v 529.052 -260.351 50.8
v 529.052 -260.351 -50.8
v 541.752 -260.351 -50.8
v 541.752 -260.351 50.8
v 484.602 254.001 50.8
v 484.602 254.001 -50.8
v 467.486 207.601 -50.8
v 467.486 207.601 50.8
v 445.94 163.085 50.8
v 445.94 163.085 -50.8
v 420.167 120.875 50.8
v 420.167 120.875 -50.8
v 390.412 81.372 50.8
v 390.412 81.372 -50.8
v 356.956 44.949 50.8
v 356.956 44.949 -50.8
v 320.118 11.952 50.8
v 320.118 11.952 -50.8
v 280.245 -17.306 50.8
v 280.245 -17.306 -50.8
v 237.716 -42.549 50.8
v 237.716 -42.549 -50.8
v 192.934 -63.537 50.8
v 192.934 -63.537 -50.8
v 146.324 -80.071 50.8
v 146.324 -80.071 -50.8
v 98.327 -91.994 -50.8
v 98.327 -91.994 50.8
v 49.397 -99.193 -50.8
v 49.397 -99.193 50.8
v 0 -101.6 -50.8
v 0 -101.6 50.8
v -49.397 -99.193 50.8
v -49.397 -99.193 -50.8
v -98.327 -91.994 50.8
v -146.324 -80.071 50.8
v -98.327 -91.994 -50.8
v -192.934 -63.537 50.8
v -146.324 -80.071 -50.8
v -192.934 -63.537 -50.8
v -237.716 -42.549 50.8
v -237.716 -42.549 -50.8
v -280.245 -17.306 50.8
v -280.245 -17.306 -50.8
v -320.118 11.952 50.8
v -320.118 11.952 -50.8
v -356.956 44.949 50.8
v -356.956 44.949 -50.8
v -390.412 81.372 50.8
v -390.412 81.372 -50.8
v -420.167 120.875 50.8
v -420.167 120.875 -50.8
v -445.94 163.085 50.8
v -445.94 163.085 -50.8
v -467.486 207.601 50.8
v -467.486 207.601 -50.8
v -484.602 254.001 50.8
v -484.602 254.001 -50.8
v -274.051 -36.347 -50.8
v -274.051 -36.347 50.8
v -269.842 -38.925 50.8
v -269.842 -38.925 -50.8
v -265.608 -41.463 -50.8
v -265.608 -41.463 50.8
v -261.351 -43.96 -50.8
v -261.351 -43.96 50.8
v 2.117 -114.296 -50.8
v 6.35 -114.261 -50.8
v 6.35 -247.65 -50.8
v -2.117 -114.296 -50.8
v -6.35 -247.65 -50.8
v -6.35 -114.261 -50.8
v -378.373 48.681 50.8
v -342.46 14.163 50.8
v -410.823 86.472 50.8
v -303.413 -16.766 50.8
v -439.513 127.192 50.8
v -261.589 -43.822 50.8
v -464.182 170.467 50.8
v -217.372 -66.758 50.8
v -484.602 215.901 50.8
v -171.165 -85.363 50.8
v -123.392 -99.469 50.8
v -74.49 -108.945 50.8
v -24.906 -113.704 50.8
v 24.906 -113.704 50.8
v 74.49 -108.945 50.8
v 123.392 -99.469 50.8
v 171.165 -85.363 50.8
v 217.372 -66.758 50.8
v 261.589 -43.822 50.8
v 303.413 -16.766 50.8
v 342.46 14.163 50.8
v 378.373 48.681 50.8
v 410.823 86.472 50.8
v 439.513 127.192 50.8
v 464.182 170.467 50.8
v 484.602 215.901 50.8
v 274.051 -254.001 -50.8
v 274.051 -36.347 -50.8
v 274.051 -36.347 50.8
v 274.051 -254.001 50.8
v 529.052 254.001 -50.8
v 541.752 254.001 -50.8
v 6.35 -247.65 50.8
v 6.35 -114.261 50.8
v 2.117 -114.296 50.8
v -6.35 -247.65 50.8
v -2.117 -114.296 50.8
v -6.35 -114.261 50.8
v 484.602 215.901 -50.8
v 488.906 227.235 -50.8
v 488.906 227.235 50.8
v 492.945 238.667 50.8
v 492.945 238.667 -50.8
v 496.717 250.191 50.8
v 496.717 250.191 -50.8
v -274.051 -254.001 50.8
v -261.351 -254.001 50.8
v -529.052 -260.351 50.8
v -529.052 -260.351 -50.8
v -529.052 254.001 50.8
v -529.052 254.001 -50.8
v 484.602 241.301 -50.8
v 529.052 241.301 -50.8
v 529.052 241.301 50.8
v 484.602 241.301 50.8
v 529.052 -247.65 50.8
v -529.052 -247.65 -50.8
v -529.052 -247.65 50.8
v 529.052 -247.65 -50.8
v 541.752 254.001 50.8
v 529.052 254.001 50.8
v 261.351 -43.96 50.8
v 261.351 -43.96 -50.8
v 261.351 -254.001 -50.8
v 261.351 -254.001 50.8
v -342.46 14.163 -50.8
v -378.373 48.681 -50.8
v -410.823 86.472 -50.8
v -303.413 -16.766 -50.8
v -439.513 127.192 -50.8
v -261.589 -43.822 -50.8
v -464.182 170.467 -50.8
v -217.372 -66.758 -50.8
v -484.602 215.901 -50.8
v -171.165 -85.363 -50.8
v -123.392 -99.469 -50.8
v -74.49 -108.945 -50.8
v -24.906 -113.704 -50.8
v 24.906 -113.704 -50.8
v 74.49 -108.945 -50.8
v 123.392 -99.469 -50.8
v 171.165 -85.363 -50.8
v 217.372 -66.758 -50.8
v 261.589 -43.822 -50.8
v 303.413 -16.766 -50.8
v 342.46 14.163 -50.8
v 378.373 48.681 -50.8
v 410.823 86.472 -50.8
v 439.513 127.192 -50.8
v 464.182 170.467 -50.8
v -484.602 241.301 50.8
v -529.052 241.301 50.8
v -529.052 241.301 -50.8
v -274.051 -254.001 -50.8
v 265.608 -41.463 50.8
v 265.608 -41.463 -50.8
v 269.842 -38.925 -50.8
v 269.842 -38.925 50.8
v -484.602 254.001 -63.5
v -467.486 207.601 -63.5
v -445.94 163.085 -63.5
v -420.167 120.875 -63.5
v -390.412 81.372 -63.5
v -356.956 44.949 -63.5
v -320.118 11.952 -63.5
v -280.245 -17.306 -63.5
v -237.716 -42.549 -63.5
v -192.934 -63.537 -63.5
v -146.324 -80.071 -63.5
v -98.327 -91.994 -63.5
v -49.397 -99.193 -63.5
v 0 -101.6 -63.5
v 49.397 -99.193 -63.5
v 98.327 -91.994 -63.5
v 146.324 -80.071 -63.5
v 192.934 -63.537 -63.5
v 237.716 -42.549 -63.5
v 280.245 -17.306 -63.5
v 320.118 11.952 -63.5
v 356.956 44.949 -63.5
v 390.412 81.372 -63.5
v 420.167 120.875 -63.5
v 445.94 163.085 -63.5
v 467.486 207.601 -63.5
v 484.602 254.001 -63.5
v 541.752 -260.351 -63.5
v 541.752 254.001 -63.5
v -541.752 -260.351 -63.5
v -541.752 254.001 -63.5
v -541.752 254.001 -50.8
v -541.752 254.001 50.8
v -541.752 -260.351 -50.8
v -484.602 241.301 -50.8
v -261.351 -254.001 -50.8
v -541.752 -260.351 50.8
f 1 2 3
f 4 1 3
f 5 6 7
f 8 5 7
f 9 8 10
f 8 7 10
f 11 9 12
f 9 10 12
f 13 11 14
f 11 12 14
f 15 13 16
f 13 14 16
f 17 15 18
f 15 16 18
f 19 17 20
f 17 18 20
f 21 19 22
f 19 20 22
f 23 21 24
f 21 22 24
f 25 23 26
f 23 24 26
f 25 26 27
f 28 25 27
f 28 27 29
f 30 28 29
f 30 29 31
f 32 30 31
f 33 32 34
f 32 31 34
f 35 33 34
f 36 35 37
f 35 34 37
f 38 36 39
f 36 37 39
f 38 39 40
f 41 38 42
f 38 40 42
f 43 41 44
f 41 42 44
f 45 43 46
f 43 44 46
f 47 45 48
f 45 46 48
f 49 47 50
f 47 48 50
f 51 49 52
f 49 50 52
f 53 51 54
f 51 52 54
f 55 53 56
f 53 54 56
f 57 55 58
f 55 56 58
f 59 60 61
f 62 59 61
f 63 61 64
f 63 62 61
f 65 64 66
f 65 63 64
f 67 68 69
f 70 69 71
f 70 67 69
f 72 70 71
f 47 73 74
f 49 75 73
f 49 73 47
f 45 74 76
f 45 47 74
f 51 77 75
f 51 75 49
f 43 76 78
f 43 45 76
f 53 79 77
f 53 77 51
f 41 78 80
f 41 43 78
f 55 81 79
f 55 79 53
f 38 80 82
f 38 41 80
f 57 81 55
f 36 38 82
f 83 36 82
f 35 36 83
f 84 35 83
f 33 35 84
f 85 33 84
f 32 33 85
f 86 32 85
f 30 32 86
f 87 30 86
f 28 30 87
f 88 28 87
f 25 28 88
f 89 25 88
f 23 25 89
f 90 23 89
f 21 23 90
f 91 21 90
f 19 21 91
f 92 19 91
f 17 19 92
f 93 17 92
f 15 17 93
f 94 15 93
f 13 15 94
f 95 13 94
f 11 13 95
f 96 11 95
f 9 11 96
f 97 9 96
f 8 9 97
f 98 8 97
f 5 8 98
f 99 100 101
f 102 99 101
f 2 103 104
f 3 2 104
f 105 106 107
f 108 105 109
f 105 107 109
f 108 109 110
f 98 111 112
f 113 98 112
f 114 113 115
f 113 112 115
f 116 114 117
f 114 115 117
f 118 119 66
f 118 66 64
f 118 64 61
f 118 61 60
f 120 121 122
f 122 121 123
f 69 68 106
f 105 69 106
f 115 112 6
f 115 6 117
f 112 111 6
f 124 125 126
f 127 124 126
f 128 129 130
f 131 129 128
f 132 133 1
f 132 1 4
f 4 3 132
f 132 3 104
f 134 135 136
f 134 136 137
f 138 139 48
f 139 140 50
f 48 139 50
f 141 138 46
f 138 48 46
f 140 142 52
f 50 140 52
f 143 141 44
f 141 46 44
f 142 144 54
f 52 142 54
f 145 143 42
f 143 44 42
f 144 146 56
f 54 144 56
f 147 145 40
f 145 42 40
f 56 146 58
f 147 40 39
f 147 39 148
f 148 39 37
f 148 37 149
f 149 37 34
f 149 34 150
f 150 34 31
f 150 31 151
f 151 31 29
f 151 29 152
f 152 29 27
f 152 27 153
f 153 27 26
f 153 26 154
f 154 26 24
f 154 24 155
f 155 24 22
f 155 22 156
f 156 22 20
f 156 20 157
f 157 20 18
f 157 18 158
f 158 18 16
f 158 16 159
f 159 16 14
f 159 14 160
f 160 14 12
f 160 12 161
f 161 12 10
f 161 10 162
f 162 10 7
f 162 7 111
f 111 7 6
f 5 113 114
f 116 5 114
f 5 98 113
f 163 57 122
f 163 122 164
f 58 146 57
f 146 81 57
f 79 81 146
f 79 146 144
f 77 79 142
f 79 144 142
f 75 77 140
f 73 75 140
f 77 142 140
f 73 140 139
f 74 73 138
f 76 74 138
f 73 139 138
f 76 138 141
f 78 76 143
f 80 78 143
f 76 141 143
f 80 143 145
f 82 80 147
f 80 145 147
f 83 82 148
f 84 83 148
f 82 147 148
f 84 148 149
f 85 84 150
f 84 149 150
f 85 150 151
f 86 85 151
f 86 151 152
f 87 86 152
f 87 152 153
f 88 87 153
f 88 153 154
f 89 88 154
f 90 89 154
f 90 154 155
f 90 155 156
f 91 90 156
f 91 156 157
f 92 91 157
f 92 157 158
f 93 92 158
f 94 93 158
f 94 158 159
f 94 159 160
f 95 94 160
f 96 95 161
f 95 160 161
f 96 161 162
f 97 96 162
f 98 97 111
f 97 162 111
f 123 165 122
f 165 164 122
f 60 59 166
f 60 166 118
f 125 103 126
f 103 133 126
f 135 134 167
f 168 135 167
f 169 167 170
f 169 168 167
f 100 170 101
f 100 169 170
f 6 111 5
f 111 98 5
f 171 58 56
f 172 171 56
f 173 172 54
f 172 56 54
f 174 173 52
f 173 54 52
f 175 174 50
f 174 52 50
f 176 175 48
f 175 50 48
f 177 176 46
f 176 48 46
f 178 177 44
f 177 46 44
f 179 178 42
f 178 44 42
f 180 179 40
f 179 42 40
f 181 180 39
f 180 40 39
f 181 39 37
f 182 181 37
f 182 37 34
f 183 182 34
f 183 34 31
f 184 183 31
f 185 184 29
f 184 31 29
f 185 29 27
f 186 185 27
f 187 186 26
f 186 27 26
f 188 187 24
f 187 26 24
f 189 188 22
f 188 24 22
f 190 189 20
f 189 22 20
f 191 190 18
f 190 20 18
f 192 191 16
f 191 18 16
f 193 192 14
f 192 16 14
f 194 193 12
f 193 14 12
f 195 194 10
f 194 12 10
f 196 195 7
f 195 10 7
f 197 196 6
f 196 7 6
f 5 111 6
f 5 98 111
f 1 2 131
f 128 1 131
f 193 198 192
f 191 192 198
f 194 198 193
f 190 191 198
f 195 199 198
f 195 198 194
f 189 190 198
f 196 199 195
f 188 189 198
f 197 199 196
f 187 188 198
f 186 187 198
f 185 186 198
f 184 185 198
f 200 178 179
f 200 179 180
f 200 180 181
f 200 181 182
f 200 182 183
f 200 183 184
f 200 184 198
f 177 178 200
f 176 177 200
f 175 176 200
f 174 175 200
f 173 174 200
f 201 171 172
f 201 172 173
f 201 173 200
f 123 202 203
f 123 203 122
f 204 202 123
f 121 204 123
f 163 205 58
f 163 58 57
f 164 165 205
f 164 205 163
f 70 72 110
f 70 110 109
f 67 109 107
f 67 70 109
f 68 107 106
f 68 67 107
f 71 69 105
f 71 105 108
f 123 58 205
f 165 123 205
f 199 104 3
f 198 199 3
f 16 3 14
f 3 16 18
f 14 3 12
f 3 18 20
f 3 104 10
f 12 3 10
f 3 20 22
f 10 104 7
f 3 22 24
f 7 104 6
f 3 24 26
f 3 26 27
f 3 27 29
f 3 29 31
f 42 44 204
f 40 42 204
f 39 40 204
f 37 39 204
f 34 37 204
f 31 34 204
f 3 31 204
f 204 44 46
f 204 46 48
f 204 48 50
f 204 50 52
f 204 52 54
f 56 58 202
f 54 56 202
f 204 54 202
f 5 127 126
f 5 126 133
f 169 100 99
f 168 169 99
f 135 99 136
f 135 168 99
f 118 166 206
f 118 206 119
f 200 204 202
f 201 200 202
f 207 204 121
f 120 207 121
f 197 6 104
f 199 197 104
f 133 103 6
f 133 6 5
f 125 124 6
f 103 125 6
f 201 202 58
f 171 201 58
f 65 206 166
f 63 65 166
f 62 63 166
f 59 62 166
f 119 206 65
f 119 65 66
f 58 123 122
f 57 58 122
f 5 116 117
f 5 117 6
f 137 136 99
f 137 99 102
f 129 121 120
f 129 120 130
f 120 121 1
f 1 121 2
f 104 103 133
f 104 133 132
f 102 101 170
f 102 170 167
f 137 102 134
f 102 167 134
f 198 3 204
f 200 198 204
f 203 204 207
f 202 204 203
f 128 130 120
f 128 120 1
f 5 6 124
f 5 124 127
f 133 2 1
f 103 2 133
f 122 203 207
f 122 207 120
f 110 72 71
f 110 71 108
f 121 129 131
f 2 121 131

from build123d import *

# Parameters (mm, degrees)
FLAT_START                                = -50.8001016
FLAT_BAR_CONFIGURED_FB_4_X_0_5_1_OUT_W    = 12.7000254
FLAT_BAR_CONFIGURED_FB_4_X_0_5_1_OUT_H    = 514.351028702
FLAT_BAR_CONFIGURED_FB_4_X_0_5_1_DEPTH    = 101.6002032
FLAT_BAR_CONFIGURED_FB_4_X_0_5_1_2_O_W    = 1058.104141648
FLAT_BAR_CONFIGURED_FB_4_X_0_5_1_2_O_H    = 12.7000254
FLAT_BAR_CONFIGURED_FB_4_X_0_5_1_2_DEPTH  = 101.6002032
FLAT_BAR_CONFIGURED_FB_4_X_0_5_1_3_O_W    = 12.7000254
FLAT_BAR_CONFIGURED_FB_4_X_0_5_1_3_O_H    = 514.351028702
FLAT_BAR_CONFIGURED_FB_4_X_0_5_1_3_DEPTH  = 101.6002032
LAYOUT11_W                                = 101.6
LAYOUT11_H                                = 12.7
MIDDLE_BAR_DEPTH                          = 152.400304801
LAYOUT6_W                                 = 101.6
LAYOUT6_H                                 = 12.7
FLAT_BAR_CONFIGURED_FB_4_X_0_5_4_DEPTH    = 50.8
LAYOUT7_W                                 = 101.6
LAYOUT7_H                                 = 12.7
FLAT_BAR_CONFIGURED_FB_4_X_0_5_5_DEPTH    = 50.8
FLAT_START_2                              = -50.8
FLAT_BAR_CONFIGURED_FB_4_X_0_5_6_DEPTH    = 101.6
TRIM_EXTEND12_START                       = -50.8
TRIM_EXTEND12_DEPTH                       = 101.6
LAYOUT9_W                                 = 101.6
LAYOUT9_H                                 = 12.7
FLAT_BAR_CONFIGURED_FB_4_X_0_5_15_DEPTH   = 228.659286135
LAYOUT9_ON_SEGMENT_2_W                    = 101.6
LAYOUT9_ON_SEGMENT_2_H                    = 12.7
FLAT_BAR_CONFIGURED_FB_4_X_0_5_15_2_DEPTH = 228.659286135
BOSS_EXTRUDE1_DEPTH                       = 12.7


# Read off the part's stored shape, not the designer's step: Flat bar - configured FB - 4 X 0.5(1), Flat bar - configured FB - 4 X 0.5(6), Trim/Extend11, Trim/Extend12
with BuildPart() as part:
    # Flat bar - configured FB - 4 X 0.5(1) out → Flat bar - configured FB - 4 X 0.5(1) (new body)
    with BuildSketch(Plane.XY.offset(FLAT_START)):
        with Locations((-535.402083524, -3.17500635)):
            Rectangle(FLAT_BAR_CONFIGURED_FB_4_X_0_5_1_OUT_W, FLAT_BAR_CONFIGURED_FB_4_X_0_5_1_OUT_H)
    extrude(amount=FLAT_BAR_CONFIGURED_FB_4_X_0_5_1_DEPTH)


with BuildPart() as body_2:
    # Flat bar - configured FB - 4 X 0.5_1 2 o → Flat bar - configured FB - 4 X 0.5_1 2 (new body)
    with BuildSketch(Plane.XY.offset(FLAT_START)):
        with Locations((0, -254.000508001)):
            Rectangle(FLAT_BAR_CONFIGURED_FB_4_X_0_5_1_2_O_W, FLAT_BAR_CONFIGURED_FB_4_X_0_5_1_2_O_H)
    extrude(amount=FLAT_BAR_CONFIGURED_FB_4_X_0_5_1_2_DEPTH)


with BuildPart() as body_3:
    # Flat bar - configured FB - 4 X 0.5_1 3 o → Flat bar - configured FB - 4 X 0.5_1 3 (new body)
    with BuildSketch(Plane.XY.offset(FLAT_START)):
        with Locations((535.402083524, -3.17500635)):
            Rectangle(FLAT_BAR_CONFIGURED_FB_4_X_0_5_1_3_O_W, FLAT_BAR_CONFIGURED_FB_4_X_0_5_1_3_O_H)
    extrude(amount=FLAT_BAR_CONFIGURED_FB_4_X_0_5_1_3_DEPTH)


with BuildPart() as body_4:
    # Layout11 → Middle Bar (new body)
    with BuildSketch(Plane(origin=(0, -101.6002032, 0), x_dir=(0, 0, 1), z_dir=(0, -1, 0))):
        Rectangle(LAYOUT11_W, LAYOUT11_H)
    extrude(amount=MIDDLE_BAR_DEPTH)

    # Trim/Extend1
    split(bisect_by=Plane(origin=(0, -247.650495301, 0), x_dir=(-1, 0, 0), z_dir=(0, 1, 0)), keep=Keep.TOP)

    # Trim/Extend12 outline → Trim/Extend12 (cut)
    with BuildSketch(Plane.XY.offset(TRIM_EXTEND12_START)):
        with BuildLine():
            ThreePointArc((-6.35, -114.261482324), (0, -114.3002032), (6.35, -114.261482324))
            Line((6.35, -114.261482324), (6.35, -101.6002032))
            Line((6.35, -101.6002032), (-6.35, -101.6002032))
            Line((-6.35, -101.6002032), (-6.35, -114.261482324))
        make_face()
    extrude(amount=TRIM_EXTEND12_DEPTH, mode=Mode.SUBTRACT)


with BuildPart() as body_5:
    # Layout6 → Flat bar - configured FB - 4 X 0.5(4) (new body)
    with BuildSketch(Plane(origin=(-535.402083524, 247.650508001, 0), x_dir=(0, 0, 1), z_dir=(1, 0, 0))):
        Rectangle(LAYOUT6_W, LAYOUT6_H)
    extrude(amount=FLAT_BAR_CONFIGURED_FB_4_X_0_5_4_DEPTH)

    # Trim/Extend7
    split(bisect_by=Plane(origin=(-529.052070824, -3.17500635, 0), x_dir=(0, 1, 0), z_dir=(1, 0, 0)), keep=Keep.TOP)


with BuildPart() as body_6:
    # Layout7 → Flat bar - configured FB - 4 X 0.5(5) (new body)
    with BuildSketch(Plane(origin=(535.402083524, 247.650508001, 0), x_dir=(0, 0, 1), z_dir=(-1, 0, 0))):
        Rectangle(LAYOUT7_W, LAYOUT7_H)
    extrude(amount=FLAT_BAR_CONFIGURED_FB_4_X_0_5_5_DEPTH)

    # Trim/Extend8
    split(bisect_by=Plane(origin=(529.052070824, -3.17500635, 0), x_dir=(0, -1, 0), z_dir=(-1, 0, 0)), keep=Keep.TOP)


with BuildPart() as body_7:
    # Flat bar - configured FB - 4 X 0.5(6) out → Flat bar - configured FB - 4 X 0.5(6) (new body)
    with BuildSketch(Plane.XY.offset(FLAT_START_2)):
        with BuildLine():
            Line((496.717111382, 250.190508001), (484.602083524, 254.000508001))
            ThreePointArc((484.602083524, 254.000508001), (0, -101.6002032), (-484.602083524, 254.000508001))
            Line((-484.602083524, 254.000508001), (-496.717111382, 250.190508001))
            ThreePointArc((-496.717111382, 250.190508001), (0, -114.3002032), (496.717111382, 250.190508001))
        make_face()
    extrude(amount=FLAT_BAR_CONFIGURED_FB_4_X_0_5_6_DEPTH)

    # Trim/Extend9
    split(bisect_by=Plane(origin=(-484.602083524, 247.650508001, 0), x_dir=(0, 1, 0), z_dir=(1, 0, 0)), keep=Keep.TOP)


with BuildPart() as body_8:
    # Trim/Extend11: the piece on the far side of the plane
    add(body_7.part)
    split(bisect_by=Plane.YZ.offset(484.602083524), keep=Keep.BOTTOM)


with BuildPart() as body_7_1:
    add(body_7.part)

    # Trim/Extend11
    split(bisect_by=Plane.YZ.offset(484.602083524), keep=Keep.TOP)


with BuildPart() as body_9:
    # Layout9 → Flat bar - configured FB - 4 X 0.5(15) (new body)
    with BuildSketch(Plane(origin=(-267.701041762, -25.341221866, 0), x_dir=(0, 0, 1), z_dir=(0, -1, 0))):
        Rectangle(LAYOUT9_W, LAYOUT9_H)
    extrude(amount=FLAT_BAR_CONFIGURED_FB_4_X_0_5_15_DEPTH)

    # Trim_Extend13 4: cut back where it meets the other member's skin (coped)
    split(bisect_by=body_8.part.faces().sort_by_distance((0, -114.3002032, 0))[0], keep=Keep.TOP)


with BuildPart() as body_10:
    # Layout9 on segment 2 (carried to segment 2) → Flat bar - configured FB - 4 X 0.5_15 2 (new body)
    with BuildSketch(Plane(origin=(267.701041762, -25.341221866, 0), x_dir=(0, 0, 1), z_dir=(0, -1, 0))):
        Rectangle(LAYOUT9_ON_SEGMENT_2_W, LAYOUT9_ON_SEGMENT_2_H)
    extrude(amount=FLAT_BAR_CONFIGURED_FB_4_X_0_5_15_2_DEPTH)

    # Trim_Extend13 4: cut back where it meets the other member's skin (coped)
    split(bisect_by=body_8.part.faces().sort_by_distance((0, -114.3002032, 0))[0], keep=Keep.TOP)


with BuildPart() as body_11:
    # Sketch3 → Boss-Extrude1 (new body)
    with BuildSketch(Plane(origin=(0, 0, -50.8001016), x_dir=(-1, 0, 0), z_dir=(0, 0, -1))):
        with BuildLine():
            Line((541.752096224, -260.350520701), (541.752096224, 254.000508001))
            Line((541.752096224, 254.000508001), (484.602083524, 254.000508001))
            ThreePointArc((484.602083524, 254.000508001), (0, -101.6002032), (-484.602083524, 254.000508001))
            Line((-484.602083524, 254.000508001), (-541.752096224, 254.000508001))
            Line((-541.752096224, 254.000508001), (-541.752096224, -260.350520701))
            Line((-541.752096224, -260.350520701), (541.752096224, -260.350520701))
        make_face()
    extrude(amount=BOSS_EXTRUDE1_DEPTH)


solid = Compound([part.part, body_2.part, body_3.part, body_4.part, body_5.part, body_6.part, body_8.part, body_7_1.part, body_9.part, body_10.part, body_11.part])
